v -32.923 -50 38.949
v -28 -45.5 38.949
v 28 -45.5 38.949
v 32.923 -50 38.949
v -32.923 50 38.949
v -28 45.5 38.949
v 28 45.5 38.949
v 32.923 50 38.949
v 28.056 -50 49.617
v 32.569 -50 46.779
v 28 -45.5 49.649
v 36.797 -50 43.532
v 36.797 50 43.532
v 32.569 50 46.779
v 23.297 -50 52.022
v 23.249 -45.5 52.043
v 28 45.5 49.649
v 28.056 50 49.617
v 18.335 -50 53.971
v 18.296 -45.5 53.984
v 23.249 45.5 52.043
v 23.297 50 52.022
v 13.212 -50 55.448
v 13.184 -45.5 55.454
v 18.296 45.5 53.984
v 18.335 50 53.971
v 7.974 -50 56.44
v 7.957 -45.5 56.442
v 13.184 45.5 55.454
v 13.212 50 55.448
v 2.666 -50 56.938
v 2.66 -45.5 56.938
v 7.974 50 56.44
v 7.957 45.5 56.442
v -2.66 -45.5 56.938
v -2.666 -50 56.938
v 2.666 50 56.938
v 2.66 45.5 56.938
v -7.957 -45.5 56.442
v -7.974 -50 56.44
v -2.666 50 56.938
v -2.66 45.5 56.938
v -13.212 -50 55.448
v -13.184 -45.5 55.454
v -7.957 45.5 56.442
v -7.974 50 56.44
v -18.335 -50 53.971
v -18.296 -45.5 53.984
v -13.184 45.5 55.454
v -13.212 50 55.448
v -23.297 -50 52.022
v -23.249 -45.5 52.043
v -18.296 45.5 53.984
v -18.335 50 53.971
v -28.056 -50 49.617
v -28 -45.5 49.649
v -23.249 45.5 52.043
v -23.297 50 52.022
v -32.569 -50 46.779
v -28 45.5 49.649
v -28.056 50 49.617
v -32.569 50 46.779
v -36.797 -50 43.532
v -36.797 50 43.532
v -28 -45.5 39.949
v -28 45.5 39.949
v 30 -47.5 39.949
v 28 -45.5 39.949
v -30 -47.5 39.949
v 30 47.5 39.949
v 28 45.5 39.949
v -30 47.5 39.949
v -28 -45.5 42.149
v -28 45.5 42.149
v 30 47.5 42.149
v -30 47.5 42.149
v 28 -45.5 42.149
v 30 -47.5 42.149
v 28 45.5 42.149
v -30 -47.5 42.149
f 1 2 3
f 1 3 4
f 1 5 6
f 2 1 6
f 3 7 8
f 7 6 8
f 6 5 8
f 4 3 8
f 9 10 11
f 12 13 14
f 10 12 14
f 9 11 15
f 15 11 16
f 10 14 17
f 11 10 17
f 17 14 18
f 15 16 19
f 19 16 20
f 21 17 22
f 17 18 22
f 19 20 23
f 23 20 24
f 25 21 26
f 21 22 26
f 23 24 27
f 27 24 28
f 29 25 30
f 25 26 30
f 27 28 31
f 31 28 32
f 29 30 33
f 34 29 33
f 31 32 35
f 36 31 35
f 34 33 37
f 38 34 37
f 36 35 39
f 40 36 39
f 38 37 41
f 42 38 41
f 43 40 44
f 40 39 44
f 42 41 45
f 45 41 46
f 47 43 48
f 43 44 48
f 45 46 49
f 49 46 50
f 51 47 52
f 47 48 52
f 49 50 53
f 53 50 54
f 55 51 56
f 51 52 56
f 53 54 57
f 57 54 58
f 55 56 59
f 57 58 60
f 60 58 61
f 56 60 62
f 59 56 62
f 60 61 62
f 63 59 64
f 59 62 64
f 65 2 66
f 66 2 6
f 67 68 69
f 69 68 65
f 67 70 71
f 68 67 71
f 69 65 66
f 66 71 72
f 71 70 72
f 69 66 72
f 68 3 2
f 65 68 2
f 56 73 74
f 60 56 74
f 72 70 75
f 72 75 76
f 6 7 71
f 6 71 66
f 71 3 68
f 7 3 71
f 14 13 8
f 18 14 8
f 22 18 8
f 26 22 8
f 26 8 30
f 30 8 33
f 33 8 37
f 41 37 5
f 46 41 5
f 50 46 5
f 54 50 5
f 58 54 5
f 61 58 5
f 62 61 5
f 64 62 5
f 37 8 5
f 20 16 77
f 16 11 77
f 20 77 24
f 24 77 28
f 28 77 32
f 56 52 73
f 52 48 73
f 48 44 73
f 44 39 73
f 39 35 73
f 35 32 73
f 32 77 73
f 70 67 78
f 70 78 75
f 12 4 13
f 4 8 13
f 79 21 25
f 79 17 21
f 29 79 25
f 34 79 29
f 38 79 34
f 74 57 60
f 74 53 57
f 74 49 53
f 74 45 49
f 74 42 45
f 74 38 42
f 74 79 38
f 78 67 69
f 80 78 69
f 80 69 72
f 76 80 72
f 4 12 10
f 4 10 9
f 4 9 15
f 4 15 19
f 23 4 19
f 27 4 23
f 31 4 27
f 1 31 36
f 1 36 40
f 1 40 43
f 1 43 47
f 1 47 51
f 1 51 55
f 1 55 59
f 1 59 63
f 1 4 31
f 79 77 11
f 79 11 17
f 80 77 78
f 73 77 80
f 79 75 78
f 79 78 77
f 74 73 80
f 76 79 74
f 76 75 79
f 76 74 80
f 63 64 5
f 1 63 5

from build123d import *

# Parameters (mm, degrees)
BOSS_EXTRUDE1_DEPTH = 50
SKETCH2_W           = 56
SKETCH2_H           = 91
CUT_EXTRUDE1_DEPTH  = 65.651656333
CUT_EXTRUDE2_START  = -1
SKETCH3_W           = 60
SKETCH3_H           = 95
CUT_EXTRUDE2_DEPTH  = 2.2


with BuildPart() as part:
    # Sketch1 → Boss-Extrude1 (new, symmetric)
    with BuildSketch(Plane(origin=(0, 0, 0), x_dir=(1, 0, 0), z_dir=(0, 1, 0))):
        with BuildLine():
            Line((-36.796835842, -43.531515848), (-32.9234847, -38.949251022))
            Line((-32.9234847, -38.949251022), (32.9234847, -38.949251022))
            Line((32.9234847, -38.949251022), (36.796835842, -43.531515848))
            ThreePointArc((36.796835842, -43.531515848), (0, -57), (-36.796835842, -43.531515848))
        make_face()
    extrude(amount=BOSS_EXTRUDE1_DEPTH, both=True)

    # Sketch2 → Cut-Extrude1 (cut, through all)
    with BuildSketch(Plane(origin=(0, 0, 38.949251022), x_dir=(-1, 0, 0), z_dir=(0, 0, -1))):
        Rectangle(SKETCH2_W, SKETCH2_H)
    extrude(amount=-CUT_EXTRUDE1_DEPTH, mode=Mode.SUBTRACT)

    # Sketch3 → Cut-Extrude2 (cut)
    with BuildSketch(Plane(origin=(0, 0, 38.949251022), x_dir=(-1, 0, 0), z_dir=(0, 0, -1)).offset(CUT_EXTRUDE2_START)):
        Rectangle(SKETCH3_W, SKETCH3_H)
    extrude(amount=-CUT_EXTRUDE2_DEPTH, mode=Mode.SUBTRACT)


solid = part.part
